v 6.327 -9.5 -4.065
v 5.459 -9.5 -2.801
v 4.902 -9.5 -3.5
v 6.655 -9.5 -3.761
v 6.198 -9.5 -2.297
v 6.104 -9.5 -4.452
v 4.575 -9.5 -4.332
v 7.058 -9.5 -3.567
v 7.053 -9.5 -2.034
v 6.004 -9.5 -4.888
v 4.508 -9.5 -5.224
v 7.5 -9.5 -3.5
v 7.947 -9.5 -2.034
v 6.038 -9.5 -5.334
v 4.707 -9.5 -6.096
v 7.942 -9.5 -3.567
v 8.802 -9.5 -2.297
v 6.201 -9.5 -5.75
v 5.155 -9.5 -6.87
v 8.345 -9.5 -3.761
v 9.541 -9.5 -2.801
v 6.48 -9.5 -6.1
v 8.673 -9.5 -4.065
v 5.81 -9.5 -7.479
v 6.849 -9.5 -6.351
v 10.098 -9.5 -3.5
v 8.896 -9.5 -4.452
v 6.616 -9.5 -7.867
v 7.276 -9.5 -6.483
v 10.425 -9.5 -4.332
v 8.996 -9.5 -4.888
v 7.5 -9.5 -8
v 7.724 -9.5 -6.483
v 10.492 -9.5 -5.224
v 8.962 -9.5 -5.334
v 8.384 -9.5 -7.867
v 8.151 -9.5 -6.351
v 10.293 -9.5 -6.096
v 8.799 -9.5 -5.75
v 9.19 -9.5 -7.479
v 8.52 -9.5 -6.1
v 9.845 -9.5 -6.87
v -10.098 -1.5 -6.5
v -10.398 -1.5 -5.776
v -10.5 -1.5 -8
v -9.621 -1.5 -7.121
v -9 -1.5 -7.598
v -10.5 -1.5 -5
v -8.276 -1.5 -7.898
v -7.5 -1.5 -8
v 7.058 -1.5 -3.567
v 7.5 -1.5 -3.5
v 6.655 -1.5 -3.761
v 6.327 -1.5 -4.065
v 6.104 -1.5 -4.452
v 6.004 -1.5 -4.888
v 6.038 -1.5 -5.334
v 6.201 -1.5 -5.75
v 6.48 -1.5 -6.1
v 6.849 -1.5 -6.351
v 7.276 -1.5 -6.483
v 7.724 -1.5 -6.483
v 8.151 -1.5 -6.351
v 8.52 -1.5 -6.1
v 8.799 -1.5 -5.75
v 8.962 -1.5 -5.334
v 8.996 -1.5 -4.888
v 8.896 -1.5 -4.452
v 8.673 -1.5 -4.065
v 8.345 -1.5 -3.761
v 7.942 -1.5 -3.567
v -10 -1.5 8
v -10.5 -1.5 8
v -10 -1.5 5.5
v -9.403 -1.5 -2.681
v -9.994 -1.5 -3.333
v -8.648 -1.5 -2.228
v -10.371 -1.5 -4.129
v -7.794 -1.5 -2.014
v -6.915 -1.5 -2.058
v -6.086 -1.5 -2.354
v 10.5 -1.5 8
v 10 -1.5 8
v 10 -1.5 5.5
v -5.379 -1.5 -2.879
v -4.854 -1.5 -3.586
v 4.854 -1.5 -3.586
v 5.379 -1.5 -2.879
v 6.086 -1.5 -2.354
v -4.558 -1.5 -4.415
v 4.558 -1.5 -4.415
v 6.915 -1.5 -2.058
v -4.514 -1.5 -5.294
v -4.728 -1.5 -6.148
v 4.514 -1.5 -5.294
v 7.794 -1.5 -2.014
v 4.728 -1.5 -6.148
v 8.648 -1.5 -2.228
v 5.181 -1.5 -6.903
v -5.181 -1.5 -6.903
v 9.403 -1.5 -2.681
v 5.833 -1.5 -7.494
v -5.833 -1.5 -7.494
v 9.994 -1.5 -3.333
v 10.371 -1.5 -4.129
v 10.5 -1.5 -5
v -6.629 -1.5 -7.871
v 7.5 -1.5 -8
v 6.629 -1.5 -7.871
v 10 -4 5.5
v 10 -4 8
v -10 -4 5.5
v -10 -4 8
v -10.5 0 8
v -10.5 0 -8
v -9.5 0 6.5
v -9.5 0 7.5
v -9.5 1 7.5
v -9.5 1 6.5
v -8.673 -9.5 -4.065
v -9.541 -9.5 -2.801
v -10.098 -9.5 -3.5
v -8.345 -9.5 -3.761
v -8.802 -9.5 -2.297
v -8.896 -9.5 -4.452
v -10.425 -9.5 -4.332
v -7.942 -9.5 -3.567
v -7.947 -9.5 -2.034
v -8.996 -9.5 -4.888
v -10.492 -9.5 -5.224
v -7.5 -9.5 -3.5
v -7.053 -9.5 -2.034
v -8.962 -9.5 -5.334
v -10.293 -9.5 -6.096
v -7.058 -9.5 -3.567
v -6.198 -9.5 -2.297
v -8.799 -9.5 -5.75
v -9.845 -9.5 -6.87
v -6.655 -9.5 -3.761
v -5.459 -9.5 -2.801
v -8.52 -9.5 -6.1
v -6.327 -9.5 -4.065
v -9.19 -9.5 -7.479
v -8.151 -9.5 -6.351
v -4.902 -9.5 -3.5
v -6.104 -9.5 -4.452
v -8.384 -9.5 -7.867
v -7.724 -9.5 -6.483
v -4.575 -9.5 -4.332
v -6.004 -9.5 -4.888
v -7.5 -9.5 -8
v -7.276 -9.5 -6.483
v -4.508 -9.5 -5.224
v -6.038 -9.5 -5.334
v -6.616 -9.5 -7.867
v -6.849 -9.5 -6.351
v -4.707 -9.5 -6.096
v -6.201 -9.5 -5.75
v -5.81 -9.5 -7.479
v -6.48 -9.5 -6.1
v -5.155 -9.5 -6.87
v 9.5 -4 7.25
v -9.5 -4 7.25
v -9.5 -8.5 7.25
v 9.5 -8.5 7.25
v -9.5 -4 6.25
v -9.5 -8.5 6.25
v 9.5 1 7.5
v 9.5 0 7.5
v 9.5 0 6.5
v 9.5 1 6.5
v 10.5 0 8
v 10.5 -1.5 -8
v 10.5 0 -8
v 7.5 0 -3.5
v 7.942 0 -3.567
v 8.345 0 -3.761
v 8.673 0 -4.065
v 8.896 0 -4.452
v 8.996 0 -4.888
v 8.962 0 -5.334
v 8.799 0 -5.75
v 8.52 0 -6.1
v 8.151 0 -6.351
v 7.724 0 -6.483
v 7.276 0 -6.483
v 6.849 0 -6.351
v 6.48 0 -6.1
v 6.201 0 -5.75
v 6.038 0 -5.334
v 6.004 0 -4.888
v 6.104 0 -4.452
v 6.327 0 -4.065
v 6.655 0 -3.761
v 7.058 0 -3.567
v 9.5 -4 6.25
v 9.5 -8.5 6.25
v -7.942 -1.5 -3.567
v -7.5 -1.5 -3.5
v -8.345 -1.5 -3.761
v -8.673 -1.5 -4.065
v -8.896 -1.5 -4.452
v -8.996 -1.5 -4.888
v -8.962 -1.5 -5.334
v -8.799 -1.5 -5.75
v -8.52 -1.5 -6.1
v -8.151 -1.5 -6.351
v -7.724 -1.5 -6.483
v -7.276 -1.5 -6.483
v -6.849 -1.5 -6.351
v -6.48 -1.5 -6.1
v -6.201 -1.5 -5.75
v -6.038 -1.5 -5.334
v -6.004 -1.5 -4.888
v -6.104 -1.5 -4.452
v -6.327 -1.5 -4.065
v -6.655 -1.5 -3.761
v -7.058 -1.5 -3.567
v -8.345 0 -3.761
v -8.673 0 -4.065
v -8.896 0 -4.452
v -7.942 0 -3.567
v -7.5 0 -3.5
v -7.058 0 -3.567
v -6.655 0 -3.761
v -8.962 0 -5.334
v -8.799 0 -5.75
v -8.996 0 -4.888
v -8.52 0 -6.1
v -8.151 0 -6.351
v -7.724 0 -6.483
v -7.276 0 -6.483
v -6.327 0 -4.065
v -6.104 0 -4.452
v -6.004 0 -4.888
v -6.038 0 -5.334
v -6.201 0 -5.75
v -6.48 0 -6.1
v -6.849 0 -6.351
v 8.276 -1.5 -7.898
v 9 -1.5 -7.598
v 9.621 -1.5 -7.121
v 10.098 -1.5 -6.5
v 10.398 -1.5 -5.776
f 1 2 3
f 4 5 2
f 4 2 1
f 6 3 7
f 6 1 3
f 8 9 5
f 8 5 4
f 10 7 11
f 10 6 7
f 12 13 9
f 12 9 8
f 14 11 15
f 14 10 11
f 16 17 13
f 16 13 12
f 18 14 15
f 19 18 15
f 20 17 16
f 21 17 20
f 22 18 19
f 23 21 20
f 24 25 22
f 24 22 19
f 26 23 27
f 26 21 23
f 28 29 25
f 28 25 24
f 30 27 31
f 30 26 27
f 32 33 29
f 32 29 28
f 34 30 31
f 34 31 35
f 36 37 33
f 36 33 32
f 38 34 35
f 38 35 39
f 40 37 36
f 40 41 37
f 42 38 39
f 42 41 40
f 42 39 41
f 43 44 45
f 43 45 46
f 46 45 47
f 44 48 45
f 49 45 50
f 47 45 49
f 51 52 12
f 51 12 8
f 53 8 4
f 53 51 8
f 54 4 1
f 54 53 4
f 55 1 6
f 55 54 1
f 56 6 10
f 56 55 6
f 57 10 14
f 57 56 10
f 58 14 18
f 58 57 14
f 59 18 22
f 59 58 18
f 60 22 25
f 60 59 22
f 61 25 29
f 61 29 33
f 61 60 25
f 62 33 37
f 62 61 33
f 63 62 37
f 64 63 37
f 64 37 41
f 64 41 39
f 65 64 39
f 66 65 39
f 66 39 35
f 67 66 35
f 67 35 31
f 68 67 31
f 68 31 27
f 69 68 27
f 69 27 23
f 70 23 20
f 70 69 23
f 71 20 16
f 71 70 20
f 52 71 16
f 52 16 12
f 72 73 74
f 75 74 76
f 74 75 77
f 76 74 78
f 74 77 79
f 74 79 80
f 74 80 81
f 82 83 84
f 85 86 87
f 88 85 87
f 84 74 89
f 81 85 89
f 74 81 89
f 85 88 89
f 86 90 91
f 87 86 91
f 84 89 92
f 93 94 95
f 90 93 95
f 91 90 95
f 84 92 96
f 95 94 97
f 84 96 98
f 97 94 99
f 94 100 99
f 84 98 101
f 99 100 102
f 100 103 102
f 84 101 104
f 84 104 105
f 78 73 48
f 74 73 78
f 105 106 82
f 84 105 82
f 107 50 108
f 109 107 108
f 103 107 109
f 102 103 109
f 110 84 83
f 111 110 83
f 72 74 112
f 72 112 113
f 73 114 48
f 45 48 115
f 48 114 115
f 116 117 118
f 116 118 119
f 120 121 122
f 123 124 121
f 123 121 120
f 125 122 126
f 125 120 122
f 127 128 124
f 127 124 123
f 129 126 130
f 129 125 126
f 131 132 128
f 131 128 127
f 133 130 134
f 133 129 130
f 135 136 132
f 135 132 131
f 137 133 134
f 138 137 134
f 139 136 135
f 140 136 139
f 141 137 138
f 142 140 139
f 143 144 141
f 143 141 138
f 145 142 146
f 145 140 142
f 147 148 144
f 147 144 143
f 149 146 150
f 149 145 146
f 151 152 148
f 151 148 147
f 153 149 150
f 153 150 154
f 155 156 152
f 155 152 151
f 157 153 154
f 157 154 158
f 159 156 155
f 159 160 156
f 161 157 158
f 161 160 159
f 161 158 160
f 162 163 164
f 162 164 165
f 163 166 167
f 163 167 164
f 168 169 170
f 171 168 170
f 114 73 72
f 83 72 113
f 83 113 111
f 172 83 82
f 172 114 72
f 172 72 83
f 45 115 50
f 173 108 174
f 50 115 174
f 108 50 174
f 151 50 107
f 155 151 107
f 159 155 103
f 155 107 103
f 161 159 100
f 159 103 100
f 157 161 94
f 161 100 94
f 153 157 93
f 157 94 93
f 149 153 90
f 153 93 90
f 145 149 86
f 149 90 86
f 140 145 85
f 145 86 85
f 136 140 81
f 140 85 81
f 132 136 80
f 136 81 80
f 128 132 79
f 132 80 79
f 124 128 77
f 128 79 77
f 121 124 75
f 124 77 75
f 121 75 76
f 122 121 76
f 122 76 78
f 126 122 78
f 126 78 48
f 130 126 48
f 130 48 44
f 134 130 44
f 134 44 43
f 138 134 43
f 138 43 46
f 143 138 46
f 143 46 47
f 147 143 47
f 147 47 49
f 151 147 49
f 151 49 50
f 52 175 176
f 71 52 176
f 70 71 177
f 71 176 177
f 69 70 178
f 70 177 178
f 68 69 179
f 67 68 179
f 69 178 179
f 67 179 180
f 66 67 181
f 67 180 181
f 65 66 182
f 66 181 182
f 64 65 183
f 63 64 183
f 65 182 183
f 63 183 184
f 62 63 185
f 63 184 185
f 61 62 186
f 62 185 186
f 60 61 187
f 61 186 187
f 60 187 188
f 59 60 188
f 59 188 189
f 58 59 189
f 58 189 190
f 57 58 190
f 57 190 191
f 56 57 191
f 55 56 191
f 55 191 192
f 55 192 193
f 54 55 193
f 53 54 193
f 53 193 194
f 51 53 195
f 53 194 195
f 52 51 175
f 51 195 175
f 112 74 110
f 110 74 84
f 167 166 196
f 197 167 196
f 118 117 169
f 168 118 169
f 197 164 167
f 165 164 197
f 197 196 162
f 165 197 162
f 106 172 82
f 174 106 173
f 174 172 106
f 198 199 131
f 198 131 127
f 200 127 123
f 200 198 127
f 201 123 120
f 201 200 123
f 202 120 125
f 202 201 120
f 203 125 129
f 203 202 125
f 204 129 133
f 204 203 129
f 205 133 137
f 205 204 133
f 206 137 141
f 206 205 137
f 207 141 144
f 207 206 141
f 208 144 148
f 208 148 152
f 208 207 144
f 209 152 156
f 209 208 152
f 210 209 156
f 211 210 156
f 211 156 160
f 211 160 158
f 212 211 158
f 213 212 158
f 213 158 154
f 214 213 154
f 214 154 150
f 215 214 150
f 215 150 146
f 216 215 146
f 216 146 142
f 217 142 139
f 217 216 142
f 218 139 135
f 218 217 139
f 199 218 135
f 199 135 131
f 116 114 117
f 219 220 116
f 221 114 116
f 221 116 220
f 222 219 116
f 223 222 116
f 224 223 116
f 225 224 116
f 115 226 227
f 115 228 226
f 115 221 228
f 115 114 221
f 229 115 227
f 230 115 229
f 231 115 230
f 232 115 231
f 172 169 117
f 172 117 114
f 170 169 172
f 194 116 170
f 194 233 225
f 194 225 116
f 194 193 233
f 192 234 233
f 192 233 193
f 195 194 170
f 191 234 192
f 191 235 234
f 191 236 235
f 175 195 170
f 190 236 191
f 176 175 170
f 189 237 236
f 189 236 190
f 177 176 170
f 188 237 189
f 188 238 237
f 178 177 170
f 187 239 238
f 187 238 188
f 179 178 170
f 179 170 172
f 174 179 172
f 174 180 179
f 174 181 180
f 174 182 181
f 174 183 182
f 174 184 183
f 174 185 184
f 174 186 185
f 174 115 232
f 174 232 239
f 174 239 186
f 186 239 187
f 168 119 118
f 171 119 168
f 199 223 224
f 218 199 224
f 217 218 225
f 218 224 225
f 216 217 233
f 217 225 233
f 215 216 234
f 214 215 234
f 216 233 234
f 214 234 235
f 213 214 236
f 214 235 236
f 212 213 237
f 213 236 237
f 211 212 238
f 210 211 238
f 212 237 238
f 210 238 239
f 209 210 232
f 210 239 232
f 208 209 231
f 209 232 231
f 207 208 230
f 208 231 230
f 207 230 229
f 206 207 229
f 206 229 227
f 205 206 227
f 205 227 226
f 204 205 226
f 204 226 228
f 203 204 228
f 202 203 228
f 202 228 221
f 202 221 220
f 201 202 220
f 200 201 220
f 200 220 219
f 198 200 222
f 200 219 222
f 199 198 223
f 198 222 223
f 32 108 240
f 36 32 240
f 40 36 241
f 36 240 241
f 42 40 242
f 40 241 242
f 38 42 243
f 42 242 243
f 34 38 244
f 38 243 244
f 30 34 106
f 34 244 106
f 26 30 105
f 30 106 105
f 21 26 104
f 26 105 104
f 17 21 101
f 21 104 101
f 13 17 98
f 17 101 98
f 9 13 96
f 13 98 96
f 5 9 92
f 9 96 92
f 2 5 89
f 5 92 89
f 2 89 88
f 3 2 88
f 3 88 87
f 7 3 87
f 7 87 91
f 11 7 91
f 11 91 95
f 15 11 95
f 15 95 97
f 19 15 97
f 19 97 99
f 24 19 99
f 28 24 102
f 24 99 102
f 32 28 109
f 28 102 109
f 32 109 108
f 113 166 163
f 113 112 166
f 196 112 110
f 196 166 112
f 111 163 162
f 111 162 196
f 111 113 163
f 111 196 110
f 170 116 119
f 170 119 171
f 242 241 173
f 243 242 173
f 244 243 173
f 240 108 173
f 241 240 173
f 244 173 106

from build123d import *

# Parameters (mm, degrees)
SKETCH_1_W      = 21
SKETCH_1_H      = 16
SKETCH_1_R      = 1.5
EXTRUDE_2_DEPTH = 1.5
SKETCH_1_4_W    = 19
SKETCH_1_4_H    = 1
EXTRUDE_3_DEPTH = 1
SKETCH_3_W      = 19
SKETCH_3_H      = 1
EXTRUDE_4_DEPTH = 7
SKETCH_3_3_W    = 20
SKETCH_3_3_H    = 2.5
EXTRUDE_5_DEPTH = 2.5
SKETCH_4_R      = 3
SKETCH_4_R_2    = 1.5
EXTRUDE_6_DEPTH = 8


with BuildPart() as part:
    # Эскиз1 → Бобышка-Вытянуть2 (new body)
    with BuildSketch(Plane(origin=(0, 0, 0), x_dir=(1, 0, 0), z_dir=(0, 1, 0))):
        Rectangle(SKETCH_1_W, SKETCH_1_H)
        with Locations((-7.5, 5)):
            Circle(SKETCH_1_R, mode=Mode.SUBTRACT)
        with Locations((7.5, 5)):
            Circle(SKETCH_1_R, mode=Mode.SUBTRACT)
    extrude(amount=-EXTRUDE_2_DEPTH)

    # Эскиз1<4> → Бобышка-Вытянуть3 (add)
    with BuildSketch(Plane(origin=(0, 0, 0), x_dir=(1, 0, 0), z_dir=(0, 1, 0))):
        with Locations((0, -7)):
            Rectangle(SKETCH_1_4_W, SKETCH_1_4_H)
    extrude(amount=EXTRUDE_3_DEPTH)

    # Эскиз3 → Бобышка-Вытянуть4 (add)
    with BuildSketch(Plane.XZ.offset(1.5)):
        with Locations((0, 6.75)):
            Rectangle(SKETCH_3_W, SKETCH_3_H)
    extrude(amount=EXTRUDE_4_DEPTH)

    # Эскиз3<3> → Бобышка-Вытянуть5 (add)
    with BuildSketch(Plane.XZ.offset(1.5)):
        with Locations((0, 6.75)):
            Rectangle(SKETCH_3_3_W, SKETCH_3_3_H)
    extrude(amount=EXTRUDE_5_DEPTH)

    # Эскиз4 → Бобышка-Вытянуть6 (add)
    # profile 1 of 2: a face of its own
    with BuildSketch(Plane.XZ.offset(1.5)):
        with Locations((-7.5, -5)):
            Circle(SKETCH_4_R)
        with Locations((-7.5, -5)):
            Circle(SKETCH_4_R_2, mode=Mode.SUBTRACT)
    # profile 2 of 2: a face of its own
    with BuildSketch(Plane.XZ.offset(1.5)):
        with Locations((7.5, -5)):
            Circle(SKETCH_4_R)
        with Locations((7.5, -5)):
            Circle(SKETCH_4_R_2, mode=Mode.SUBTRACT)
    extrude(amount=EXTRUDE_6_DEPTH)


solid = part.part
